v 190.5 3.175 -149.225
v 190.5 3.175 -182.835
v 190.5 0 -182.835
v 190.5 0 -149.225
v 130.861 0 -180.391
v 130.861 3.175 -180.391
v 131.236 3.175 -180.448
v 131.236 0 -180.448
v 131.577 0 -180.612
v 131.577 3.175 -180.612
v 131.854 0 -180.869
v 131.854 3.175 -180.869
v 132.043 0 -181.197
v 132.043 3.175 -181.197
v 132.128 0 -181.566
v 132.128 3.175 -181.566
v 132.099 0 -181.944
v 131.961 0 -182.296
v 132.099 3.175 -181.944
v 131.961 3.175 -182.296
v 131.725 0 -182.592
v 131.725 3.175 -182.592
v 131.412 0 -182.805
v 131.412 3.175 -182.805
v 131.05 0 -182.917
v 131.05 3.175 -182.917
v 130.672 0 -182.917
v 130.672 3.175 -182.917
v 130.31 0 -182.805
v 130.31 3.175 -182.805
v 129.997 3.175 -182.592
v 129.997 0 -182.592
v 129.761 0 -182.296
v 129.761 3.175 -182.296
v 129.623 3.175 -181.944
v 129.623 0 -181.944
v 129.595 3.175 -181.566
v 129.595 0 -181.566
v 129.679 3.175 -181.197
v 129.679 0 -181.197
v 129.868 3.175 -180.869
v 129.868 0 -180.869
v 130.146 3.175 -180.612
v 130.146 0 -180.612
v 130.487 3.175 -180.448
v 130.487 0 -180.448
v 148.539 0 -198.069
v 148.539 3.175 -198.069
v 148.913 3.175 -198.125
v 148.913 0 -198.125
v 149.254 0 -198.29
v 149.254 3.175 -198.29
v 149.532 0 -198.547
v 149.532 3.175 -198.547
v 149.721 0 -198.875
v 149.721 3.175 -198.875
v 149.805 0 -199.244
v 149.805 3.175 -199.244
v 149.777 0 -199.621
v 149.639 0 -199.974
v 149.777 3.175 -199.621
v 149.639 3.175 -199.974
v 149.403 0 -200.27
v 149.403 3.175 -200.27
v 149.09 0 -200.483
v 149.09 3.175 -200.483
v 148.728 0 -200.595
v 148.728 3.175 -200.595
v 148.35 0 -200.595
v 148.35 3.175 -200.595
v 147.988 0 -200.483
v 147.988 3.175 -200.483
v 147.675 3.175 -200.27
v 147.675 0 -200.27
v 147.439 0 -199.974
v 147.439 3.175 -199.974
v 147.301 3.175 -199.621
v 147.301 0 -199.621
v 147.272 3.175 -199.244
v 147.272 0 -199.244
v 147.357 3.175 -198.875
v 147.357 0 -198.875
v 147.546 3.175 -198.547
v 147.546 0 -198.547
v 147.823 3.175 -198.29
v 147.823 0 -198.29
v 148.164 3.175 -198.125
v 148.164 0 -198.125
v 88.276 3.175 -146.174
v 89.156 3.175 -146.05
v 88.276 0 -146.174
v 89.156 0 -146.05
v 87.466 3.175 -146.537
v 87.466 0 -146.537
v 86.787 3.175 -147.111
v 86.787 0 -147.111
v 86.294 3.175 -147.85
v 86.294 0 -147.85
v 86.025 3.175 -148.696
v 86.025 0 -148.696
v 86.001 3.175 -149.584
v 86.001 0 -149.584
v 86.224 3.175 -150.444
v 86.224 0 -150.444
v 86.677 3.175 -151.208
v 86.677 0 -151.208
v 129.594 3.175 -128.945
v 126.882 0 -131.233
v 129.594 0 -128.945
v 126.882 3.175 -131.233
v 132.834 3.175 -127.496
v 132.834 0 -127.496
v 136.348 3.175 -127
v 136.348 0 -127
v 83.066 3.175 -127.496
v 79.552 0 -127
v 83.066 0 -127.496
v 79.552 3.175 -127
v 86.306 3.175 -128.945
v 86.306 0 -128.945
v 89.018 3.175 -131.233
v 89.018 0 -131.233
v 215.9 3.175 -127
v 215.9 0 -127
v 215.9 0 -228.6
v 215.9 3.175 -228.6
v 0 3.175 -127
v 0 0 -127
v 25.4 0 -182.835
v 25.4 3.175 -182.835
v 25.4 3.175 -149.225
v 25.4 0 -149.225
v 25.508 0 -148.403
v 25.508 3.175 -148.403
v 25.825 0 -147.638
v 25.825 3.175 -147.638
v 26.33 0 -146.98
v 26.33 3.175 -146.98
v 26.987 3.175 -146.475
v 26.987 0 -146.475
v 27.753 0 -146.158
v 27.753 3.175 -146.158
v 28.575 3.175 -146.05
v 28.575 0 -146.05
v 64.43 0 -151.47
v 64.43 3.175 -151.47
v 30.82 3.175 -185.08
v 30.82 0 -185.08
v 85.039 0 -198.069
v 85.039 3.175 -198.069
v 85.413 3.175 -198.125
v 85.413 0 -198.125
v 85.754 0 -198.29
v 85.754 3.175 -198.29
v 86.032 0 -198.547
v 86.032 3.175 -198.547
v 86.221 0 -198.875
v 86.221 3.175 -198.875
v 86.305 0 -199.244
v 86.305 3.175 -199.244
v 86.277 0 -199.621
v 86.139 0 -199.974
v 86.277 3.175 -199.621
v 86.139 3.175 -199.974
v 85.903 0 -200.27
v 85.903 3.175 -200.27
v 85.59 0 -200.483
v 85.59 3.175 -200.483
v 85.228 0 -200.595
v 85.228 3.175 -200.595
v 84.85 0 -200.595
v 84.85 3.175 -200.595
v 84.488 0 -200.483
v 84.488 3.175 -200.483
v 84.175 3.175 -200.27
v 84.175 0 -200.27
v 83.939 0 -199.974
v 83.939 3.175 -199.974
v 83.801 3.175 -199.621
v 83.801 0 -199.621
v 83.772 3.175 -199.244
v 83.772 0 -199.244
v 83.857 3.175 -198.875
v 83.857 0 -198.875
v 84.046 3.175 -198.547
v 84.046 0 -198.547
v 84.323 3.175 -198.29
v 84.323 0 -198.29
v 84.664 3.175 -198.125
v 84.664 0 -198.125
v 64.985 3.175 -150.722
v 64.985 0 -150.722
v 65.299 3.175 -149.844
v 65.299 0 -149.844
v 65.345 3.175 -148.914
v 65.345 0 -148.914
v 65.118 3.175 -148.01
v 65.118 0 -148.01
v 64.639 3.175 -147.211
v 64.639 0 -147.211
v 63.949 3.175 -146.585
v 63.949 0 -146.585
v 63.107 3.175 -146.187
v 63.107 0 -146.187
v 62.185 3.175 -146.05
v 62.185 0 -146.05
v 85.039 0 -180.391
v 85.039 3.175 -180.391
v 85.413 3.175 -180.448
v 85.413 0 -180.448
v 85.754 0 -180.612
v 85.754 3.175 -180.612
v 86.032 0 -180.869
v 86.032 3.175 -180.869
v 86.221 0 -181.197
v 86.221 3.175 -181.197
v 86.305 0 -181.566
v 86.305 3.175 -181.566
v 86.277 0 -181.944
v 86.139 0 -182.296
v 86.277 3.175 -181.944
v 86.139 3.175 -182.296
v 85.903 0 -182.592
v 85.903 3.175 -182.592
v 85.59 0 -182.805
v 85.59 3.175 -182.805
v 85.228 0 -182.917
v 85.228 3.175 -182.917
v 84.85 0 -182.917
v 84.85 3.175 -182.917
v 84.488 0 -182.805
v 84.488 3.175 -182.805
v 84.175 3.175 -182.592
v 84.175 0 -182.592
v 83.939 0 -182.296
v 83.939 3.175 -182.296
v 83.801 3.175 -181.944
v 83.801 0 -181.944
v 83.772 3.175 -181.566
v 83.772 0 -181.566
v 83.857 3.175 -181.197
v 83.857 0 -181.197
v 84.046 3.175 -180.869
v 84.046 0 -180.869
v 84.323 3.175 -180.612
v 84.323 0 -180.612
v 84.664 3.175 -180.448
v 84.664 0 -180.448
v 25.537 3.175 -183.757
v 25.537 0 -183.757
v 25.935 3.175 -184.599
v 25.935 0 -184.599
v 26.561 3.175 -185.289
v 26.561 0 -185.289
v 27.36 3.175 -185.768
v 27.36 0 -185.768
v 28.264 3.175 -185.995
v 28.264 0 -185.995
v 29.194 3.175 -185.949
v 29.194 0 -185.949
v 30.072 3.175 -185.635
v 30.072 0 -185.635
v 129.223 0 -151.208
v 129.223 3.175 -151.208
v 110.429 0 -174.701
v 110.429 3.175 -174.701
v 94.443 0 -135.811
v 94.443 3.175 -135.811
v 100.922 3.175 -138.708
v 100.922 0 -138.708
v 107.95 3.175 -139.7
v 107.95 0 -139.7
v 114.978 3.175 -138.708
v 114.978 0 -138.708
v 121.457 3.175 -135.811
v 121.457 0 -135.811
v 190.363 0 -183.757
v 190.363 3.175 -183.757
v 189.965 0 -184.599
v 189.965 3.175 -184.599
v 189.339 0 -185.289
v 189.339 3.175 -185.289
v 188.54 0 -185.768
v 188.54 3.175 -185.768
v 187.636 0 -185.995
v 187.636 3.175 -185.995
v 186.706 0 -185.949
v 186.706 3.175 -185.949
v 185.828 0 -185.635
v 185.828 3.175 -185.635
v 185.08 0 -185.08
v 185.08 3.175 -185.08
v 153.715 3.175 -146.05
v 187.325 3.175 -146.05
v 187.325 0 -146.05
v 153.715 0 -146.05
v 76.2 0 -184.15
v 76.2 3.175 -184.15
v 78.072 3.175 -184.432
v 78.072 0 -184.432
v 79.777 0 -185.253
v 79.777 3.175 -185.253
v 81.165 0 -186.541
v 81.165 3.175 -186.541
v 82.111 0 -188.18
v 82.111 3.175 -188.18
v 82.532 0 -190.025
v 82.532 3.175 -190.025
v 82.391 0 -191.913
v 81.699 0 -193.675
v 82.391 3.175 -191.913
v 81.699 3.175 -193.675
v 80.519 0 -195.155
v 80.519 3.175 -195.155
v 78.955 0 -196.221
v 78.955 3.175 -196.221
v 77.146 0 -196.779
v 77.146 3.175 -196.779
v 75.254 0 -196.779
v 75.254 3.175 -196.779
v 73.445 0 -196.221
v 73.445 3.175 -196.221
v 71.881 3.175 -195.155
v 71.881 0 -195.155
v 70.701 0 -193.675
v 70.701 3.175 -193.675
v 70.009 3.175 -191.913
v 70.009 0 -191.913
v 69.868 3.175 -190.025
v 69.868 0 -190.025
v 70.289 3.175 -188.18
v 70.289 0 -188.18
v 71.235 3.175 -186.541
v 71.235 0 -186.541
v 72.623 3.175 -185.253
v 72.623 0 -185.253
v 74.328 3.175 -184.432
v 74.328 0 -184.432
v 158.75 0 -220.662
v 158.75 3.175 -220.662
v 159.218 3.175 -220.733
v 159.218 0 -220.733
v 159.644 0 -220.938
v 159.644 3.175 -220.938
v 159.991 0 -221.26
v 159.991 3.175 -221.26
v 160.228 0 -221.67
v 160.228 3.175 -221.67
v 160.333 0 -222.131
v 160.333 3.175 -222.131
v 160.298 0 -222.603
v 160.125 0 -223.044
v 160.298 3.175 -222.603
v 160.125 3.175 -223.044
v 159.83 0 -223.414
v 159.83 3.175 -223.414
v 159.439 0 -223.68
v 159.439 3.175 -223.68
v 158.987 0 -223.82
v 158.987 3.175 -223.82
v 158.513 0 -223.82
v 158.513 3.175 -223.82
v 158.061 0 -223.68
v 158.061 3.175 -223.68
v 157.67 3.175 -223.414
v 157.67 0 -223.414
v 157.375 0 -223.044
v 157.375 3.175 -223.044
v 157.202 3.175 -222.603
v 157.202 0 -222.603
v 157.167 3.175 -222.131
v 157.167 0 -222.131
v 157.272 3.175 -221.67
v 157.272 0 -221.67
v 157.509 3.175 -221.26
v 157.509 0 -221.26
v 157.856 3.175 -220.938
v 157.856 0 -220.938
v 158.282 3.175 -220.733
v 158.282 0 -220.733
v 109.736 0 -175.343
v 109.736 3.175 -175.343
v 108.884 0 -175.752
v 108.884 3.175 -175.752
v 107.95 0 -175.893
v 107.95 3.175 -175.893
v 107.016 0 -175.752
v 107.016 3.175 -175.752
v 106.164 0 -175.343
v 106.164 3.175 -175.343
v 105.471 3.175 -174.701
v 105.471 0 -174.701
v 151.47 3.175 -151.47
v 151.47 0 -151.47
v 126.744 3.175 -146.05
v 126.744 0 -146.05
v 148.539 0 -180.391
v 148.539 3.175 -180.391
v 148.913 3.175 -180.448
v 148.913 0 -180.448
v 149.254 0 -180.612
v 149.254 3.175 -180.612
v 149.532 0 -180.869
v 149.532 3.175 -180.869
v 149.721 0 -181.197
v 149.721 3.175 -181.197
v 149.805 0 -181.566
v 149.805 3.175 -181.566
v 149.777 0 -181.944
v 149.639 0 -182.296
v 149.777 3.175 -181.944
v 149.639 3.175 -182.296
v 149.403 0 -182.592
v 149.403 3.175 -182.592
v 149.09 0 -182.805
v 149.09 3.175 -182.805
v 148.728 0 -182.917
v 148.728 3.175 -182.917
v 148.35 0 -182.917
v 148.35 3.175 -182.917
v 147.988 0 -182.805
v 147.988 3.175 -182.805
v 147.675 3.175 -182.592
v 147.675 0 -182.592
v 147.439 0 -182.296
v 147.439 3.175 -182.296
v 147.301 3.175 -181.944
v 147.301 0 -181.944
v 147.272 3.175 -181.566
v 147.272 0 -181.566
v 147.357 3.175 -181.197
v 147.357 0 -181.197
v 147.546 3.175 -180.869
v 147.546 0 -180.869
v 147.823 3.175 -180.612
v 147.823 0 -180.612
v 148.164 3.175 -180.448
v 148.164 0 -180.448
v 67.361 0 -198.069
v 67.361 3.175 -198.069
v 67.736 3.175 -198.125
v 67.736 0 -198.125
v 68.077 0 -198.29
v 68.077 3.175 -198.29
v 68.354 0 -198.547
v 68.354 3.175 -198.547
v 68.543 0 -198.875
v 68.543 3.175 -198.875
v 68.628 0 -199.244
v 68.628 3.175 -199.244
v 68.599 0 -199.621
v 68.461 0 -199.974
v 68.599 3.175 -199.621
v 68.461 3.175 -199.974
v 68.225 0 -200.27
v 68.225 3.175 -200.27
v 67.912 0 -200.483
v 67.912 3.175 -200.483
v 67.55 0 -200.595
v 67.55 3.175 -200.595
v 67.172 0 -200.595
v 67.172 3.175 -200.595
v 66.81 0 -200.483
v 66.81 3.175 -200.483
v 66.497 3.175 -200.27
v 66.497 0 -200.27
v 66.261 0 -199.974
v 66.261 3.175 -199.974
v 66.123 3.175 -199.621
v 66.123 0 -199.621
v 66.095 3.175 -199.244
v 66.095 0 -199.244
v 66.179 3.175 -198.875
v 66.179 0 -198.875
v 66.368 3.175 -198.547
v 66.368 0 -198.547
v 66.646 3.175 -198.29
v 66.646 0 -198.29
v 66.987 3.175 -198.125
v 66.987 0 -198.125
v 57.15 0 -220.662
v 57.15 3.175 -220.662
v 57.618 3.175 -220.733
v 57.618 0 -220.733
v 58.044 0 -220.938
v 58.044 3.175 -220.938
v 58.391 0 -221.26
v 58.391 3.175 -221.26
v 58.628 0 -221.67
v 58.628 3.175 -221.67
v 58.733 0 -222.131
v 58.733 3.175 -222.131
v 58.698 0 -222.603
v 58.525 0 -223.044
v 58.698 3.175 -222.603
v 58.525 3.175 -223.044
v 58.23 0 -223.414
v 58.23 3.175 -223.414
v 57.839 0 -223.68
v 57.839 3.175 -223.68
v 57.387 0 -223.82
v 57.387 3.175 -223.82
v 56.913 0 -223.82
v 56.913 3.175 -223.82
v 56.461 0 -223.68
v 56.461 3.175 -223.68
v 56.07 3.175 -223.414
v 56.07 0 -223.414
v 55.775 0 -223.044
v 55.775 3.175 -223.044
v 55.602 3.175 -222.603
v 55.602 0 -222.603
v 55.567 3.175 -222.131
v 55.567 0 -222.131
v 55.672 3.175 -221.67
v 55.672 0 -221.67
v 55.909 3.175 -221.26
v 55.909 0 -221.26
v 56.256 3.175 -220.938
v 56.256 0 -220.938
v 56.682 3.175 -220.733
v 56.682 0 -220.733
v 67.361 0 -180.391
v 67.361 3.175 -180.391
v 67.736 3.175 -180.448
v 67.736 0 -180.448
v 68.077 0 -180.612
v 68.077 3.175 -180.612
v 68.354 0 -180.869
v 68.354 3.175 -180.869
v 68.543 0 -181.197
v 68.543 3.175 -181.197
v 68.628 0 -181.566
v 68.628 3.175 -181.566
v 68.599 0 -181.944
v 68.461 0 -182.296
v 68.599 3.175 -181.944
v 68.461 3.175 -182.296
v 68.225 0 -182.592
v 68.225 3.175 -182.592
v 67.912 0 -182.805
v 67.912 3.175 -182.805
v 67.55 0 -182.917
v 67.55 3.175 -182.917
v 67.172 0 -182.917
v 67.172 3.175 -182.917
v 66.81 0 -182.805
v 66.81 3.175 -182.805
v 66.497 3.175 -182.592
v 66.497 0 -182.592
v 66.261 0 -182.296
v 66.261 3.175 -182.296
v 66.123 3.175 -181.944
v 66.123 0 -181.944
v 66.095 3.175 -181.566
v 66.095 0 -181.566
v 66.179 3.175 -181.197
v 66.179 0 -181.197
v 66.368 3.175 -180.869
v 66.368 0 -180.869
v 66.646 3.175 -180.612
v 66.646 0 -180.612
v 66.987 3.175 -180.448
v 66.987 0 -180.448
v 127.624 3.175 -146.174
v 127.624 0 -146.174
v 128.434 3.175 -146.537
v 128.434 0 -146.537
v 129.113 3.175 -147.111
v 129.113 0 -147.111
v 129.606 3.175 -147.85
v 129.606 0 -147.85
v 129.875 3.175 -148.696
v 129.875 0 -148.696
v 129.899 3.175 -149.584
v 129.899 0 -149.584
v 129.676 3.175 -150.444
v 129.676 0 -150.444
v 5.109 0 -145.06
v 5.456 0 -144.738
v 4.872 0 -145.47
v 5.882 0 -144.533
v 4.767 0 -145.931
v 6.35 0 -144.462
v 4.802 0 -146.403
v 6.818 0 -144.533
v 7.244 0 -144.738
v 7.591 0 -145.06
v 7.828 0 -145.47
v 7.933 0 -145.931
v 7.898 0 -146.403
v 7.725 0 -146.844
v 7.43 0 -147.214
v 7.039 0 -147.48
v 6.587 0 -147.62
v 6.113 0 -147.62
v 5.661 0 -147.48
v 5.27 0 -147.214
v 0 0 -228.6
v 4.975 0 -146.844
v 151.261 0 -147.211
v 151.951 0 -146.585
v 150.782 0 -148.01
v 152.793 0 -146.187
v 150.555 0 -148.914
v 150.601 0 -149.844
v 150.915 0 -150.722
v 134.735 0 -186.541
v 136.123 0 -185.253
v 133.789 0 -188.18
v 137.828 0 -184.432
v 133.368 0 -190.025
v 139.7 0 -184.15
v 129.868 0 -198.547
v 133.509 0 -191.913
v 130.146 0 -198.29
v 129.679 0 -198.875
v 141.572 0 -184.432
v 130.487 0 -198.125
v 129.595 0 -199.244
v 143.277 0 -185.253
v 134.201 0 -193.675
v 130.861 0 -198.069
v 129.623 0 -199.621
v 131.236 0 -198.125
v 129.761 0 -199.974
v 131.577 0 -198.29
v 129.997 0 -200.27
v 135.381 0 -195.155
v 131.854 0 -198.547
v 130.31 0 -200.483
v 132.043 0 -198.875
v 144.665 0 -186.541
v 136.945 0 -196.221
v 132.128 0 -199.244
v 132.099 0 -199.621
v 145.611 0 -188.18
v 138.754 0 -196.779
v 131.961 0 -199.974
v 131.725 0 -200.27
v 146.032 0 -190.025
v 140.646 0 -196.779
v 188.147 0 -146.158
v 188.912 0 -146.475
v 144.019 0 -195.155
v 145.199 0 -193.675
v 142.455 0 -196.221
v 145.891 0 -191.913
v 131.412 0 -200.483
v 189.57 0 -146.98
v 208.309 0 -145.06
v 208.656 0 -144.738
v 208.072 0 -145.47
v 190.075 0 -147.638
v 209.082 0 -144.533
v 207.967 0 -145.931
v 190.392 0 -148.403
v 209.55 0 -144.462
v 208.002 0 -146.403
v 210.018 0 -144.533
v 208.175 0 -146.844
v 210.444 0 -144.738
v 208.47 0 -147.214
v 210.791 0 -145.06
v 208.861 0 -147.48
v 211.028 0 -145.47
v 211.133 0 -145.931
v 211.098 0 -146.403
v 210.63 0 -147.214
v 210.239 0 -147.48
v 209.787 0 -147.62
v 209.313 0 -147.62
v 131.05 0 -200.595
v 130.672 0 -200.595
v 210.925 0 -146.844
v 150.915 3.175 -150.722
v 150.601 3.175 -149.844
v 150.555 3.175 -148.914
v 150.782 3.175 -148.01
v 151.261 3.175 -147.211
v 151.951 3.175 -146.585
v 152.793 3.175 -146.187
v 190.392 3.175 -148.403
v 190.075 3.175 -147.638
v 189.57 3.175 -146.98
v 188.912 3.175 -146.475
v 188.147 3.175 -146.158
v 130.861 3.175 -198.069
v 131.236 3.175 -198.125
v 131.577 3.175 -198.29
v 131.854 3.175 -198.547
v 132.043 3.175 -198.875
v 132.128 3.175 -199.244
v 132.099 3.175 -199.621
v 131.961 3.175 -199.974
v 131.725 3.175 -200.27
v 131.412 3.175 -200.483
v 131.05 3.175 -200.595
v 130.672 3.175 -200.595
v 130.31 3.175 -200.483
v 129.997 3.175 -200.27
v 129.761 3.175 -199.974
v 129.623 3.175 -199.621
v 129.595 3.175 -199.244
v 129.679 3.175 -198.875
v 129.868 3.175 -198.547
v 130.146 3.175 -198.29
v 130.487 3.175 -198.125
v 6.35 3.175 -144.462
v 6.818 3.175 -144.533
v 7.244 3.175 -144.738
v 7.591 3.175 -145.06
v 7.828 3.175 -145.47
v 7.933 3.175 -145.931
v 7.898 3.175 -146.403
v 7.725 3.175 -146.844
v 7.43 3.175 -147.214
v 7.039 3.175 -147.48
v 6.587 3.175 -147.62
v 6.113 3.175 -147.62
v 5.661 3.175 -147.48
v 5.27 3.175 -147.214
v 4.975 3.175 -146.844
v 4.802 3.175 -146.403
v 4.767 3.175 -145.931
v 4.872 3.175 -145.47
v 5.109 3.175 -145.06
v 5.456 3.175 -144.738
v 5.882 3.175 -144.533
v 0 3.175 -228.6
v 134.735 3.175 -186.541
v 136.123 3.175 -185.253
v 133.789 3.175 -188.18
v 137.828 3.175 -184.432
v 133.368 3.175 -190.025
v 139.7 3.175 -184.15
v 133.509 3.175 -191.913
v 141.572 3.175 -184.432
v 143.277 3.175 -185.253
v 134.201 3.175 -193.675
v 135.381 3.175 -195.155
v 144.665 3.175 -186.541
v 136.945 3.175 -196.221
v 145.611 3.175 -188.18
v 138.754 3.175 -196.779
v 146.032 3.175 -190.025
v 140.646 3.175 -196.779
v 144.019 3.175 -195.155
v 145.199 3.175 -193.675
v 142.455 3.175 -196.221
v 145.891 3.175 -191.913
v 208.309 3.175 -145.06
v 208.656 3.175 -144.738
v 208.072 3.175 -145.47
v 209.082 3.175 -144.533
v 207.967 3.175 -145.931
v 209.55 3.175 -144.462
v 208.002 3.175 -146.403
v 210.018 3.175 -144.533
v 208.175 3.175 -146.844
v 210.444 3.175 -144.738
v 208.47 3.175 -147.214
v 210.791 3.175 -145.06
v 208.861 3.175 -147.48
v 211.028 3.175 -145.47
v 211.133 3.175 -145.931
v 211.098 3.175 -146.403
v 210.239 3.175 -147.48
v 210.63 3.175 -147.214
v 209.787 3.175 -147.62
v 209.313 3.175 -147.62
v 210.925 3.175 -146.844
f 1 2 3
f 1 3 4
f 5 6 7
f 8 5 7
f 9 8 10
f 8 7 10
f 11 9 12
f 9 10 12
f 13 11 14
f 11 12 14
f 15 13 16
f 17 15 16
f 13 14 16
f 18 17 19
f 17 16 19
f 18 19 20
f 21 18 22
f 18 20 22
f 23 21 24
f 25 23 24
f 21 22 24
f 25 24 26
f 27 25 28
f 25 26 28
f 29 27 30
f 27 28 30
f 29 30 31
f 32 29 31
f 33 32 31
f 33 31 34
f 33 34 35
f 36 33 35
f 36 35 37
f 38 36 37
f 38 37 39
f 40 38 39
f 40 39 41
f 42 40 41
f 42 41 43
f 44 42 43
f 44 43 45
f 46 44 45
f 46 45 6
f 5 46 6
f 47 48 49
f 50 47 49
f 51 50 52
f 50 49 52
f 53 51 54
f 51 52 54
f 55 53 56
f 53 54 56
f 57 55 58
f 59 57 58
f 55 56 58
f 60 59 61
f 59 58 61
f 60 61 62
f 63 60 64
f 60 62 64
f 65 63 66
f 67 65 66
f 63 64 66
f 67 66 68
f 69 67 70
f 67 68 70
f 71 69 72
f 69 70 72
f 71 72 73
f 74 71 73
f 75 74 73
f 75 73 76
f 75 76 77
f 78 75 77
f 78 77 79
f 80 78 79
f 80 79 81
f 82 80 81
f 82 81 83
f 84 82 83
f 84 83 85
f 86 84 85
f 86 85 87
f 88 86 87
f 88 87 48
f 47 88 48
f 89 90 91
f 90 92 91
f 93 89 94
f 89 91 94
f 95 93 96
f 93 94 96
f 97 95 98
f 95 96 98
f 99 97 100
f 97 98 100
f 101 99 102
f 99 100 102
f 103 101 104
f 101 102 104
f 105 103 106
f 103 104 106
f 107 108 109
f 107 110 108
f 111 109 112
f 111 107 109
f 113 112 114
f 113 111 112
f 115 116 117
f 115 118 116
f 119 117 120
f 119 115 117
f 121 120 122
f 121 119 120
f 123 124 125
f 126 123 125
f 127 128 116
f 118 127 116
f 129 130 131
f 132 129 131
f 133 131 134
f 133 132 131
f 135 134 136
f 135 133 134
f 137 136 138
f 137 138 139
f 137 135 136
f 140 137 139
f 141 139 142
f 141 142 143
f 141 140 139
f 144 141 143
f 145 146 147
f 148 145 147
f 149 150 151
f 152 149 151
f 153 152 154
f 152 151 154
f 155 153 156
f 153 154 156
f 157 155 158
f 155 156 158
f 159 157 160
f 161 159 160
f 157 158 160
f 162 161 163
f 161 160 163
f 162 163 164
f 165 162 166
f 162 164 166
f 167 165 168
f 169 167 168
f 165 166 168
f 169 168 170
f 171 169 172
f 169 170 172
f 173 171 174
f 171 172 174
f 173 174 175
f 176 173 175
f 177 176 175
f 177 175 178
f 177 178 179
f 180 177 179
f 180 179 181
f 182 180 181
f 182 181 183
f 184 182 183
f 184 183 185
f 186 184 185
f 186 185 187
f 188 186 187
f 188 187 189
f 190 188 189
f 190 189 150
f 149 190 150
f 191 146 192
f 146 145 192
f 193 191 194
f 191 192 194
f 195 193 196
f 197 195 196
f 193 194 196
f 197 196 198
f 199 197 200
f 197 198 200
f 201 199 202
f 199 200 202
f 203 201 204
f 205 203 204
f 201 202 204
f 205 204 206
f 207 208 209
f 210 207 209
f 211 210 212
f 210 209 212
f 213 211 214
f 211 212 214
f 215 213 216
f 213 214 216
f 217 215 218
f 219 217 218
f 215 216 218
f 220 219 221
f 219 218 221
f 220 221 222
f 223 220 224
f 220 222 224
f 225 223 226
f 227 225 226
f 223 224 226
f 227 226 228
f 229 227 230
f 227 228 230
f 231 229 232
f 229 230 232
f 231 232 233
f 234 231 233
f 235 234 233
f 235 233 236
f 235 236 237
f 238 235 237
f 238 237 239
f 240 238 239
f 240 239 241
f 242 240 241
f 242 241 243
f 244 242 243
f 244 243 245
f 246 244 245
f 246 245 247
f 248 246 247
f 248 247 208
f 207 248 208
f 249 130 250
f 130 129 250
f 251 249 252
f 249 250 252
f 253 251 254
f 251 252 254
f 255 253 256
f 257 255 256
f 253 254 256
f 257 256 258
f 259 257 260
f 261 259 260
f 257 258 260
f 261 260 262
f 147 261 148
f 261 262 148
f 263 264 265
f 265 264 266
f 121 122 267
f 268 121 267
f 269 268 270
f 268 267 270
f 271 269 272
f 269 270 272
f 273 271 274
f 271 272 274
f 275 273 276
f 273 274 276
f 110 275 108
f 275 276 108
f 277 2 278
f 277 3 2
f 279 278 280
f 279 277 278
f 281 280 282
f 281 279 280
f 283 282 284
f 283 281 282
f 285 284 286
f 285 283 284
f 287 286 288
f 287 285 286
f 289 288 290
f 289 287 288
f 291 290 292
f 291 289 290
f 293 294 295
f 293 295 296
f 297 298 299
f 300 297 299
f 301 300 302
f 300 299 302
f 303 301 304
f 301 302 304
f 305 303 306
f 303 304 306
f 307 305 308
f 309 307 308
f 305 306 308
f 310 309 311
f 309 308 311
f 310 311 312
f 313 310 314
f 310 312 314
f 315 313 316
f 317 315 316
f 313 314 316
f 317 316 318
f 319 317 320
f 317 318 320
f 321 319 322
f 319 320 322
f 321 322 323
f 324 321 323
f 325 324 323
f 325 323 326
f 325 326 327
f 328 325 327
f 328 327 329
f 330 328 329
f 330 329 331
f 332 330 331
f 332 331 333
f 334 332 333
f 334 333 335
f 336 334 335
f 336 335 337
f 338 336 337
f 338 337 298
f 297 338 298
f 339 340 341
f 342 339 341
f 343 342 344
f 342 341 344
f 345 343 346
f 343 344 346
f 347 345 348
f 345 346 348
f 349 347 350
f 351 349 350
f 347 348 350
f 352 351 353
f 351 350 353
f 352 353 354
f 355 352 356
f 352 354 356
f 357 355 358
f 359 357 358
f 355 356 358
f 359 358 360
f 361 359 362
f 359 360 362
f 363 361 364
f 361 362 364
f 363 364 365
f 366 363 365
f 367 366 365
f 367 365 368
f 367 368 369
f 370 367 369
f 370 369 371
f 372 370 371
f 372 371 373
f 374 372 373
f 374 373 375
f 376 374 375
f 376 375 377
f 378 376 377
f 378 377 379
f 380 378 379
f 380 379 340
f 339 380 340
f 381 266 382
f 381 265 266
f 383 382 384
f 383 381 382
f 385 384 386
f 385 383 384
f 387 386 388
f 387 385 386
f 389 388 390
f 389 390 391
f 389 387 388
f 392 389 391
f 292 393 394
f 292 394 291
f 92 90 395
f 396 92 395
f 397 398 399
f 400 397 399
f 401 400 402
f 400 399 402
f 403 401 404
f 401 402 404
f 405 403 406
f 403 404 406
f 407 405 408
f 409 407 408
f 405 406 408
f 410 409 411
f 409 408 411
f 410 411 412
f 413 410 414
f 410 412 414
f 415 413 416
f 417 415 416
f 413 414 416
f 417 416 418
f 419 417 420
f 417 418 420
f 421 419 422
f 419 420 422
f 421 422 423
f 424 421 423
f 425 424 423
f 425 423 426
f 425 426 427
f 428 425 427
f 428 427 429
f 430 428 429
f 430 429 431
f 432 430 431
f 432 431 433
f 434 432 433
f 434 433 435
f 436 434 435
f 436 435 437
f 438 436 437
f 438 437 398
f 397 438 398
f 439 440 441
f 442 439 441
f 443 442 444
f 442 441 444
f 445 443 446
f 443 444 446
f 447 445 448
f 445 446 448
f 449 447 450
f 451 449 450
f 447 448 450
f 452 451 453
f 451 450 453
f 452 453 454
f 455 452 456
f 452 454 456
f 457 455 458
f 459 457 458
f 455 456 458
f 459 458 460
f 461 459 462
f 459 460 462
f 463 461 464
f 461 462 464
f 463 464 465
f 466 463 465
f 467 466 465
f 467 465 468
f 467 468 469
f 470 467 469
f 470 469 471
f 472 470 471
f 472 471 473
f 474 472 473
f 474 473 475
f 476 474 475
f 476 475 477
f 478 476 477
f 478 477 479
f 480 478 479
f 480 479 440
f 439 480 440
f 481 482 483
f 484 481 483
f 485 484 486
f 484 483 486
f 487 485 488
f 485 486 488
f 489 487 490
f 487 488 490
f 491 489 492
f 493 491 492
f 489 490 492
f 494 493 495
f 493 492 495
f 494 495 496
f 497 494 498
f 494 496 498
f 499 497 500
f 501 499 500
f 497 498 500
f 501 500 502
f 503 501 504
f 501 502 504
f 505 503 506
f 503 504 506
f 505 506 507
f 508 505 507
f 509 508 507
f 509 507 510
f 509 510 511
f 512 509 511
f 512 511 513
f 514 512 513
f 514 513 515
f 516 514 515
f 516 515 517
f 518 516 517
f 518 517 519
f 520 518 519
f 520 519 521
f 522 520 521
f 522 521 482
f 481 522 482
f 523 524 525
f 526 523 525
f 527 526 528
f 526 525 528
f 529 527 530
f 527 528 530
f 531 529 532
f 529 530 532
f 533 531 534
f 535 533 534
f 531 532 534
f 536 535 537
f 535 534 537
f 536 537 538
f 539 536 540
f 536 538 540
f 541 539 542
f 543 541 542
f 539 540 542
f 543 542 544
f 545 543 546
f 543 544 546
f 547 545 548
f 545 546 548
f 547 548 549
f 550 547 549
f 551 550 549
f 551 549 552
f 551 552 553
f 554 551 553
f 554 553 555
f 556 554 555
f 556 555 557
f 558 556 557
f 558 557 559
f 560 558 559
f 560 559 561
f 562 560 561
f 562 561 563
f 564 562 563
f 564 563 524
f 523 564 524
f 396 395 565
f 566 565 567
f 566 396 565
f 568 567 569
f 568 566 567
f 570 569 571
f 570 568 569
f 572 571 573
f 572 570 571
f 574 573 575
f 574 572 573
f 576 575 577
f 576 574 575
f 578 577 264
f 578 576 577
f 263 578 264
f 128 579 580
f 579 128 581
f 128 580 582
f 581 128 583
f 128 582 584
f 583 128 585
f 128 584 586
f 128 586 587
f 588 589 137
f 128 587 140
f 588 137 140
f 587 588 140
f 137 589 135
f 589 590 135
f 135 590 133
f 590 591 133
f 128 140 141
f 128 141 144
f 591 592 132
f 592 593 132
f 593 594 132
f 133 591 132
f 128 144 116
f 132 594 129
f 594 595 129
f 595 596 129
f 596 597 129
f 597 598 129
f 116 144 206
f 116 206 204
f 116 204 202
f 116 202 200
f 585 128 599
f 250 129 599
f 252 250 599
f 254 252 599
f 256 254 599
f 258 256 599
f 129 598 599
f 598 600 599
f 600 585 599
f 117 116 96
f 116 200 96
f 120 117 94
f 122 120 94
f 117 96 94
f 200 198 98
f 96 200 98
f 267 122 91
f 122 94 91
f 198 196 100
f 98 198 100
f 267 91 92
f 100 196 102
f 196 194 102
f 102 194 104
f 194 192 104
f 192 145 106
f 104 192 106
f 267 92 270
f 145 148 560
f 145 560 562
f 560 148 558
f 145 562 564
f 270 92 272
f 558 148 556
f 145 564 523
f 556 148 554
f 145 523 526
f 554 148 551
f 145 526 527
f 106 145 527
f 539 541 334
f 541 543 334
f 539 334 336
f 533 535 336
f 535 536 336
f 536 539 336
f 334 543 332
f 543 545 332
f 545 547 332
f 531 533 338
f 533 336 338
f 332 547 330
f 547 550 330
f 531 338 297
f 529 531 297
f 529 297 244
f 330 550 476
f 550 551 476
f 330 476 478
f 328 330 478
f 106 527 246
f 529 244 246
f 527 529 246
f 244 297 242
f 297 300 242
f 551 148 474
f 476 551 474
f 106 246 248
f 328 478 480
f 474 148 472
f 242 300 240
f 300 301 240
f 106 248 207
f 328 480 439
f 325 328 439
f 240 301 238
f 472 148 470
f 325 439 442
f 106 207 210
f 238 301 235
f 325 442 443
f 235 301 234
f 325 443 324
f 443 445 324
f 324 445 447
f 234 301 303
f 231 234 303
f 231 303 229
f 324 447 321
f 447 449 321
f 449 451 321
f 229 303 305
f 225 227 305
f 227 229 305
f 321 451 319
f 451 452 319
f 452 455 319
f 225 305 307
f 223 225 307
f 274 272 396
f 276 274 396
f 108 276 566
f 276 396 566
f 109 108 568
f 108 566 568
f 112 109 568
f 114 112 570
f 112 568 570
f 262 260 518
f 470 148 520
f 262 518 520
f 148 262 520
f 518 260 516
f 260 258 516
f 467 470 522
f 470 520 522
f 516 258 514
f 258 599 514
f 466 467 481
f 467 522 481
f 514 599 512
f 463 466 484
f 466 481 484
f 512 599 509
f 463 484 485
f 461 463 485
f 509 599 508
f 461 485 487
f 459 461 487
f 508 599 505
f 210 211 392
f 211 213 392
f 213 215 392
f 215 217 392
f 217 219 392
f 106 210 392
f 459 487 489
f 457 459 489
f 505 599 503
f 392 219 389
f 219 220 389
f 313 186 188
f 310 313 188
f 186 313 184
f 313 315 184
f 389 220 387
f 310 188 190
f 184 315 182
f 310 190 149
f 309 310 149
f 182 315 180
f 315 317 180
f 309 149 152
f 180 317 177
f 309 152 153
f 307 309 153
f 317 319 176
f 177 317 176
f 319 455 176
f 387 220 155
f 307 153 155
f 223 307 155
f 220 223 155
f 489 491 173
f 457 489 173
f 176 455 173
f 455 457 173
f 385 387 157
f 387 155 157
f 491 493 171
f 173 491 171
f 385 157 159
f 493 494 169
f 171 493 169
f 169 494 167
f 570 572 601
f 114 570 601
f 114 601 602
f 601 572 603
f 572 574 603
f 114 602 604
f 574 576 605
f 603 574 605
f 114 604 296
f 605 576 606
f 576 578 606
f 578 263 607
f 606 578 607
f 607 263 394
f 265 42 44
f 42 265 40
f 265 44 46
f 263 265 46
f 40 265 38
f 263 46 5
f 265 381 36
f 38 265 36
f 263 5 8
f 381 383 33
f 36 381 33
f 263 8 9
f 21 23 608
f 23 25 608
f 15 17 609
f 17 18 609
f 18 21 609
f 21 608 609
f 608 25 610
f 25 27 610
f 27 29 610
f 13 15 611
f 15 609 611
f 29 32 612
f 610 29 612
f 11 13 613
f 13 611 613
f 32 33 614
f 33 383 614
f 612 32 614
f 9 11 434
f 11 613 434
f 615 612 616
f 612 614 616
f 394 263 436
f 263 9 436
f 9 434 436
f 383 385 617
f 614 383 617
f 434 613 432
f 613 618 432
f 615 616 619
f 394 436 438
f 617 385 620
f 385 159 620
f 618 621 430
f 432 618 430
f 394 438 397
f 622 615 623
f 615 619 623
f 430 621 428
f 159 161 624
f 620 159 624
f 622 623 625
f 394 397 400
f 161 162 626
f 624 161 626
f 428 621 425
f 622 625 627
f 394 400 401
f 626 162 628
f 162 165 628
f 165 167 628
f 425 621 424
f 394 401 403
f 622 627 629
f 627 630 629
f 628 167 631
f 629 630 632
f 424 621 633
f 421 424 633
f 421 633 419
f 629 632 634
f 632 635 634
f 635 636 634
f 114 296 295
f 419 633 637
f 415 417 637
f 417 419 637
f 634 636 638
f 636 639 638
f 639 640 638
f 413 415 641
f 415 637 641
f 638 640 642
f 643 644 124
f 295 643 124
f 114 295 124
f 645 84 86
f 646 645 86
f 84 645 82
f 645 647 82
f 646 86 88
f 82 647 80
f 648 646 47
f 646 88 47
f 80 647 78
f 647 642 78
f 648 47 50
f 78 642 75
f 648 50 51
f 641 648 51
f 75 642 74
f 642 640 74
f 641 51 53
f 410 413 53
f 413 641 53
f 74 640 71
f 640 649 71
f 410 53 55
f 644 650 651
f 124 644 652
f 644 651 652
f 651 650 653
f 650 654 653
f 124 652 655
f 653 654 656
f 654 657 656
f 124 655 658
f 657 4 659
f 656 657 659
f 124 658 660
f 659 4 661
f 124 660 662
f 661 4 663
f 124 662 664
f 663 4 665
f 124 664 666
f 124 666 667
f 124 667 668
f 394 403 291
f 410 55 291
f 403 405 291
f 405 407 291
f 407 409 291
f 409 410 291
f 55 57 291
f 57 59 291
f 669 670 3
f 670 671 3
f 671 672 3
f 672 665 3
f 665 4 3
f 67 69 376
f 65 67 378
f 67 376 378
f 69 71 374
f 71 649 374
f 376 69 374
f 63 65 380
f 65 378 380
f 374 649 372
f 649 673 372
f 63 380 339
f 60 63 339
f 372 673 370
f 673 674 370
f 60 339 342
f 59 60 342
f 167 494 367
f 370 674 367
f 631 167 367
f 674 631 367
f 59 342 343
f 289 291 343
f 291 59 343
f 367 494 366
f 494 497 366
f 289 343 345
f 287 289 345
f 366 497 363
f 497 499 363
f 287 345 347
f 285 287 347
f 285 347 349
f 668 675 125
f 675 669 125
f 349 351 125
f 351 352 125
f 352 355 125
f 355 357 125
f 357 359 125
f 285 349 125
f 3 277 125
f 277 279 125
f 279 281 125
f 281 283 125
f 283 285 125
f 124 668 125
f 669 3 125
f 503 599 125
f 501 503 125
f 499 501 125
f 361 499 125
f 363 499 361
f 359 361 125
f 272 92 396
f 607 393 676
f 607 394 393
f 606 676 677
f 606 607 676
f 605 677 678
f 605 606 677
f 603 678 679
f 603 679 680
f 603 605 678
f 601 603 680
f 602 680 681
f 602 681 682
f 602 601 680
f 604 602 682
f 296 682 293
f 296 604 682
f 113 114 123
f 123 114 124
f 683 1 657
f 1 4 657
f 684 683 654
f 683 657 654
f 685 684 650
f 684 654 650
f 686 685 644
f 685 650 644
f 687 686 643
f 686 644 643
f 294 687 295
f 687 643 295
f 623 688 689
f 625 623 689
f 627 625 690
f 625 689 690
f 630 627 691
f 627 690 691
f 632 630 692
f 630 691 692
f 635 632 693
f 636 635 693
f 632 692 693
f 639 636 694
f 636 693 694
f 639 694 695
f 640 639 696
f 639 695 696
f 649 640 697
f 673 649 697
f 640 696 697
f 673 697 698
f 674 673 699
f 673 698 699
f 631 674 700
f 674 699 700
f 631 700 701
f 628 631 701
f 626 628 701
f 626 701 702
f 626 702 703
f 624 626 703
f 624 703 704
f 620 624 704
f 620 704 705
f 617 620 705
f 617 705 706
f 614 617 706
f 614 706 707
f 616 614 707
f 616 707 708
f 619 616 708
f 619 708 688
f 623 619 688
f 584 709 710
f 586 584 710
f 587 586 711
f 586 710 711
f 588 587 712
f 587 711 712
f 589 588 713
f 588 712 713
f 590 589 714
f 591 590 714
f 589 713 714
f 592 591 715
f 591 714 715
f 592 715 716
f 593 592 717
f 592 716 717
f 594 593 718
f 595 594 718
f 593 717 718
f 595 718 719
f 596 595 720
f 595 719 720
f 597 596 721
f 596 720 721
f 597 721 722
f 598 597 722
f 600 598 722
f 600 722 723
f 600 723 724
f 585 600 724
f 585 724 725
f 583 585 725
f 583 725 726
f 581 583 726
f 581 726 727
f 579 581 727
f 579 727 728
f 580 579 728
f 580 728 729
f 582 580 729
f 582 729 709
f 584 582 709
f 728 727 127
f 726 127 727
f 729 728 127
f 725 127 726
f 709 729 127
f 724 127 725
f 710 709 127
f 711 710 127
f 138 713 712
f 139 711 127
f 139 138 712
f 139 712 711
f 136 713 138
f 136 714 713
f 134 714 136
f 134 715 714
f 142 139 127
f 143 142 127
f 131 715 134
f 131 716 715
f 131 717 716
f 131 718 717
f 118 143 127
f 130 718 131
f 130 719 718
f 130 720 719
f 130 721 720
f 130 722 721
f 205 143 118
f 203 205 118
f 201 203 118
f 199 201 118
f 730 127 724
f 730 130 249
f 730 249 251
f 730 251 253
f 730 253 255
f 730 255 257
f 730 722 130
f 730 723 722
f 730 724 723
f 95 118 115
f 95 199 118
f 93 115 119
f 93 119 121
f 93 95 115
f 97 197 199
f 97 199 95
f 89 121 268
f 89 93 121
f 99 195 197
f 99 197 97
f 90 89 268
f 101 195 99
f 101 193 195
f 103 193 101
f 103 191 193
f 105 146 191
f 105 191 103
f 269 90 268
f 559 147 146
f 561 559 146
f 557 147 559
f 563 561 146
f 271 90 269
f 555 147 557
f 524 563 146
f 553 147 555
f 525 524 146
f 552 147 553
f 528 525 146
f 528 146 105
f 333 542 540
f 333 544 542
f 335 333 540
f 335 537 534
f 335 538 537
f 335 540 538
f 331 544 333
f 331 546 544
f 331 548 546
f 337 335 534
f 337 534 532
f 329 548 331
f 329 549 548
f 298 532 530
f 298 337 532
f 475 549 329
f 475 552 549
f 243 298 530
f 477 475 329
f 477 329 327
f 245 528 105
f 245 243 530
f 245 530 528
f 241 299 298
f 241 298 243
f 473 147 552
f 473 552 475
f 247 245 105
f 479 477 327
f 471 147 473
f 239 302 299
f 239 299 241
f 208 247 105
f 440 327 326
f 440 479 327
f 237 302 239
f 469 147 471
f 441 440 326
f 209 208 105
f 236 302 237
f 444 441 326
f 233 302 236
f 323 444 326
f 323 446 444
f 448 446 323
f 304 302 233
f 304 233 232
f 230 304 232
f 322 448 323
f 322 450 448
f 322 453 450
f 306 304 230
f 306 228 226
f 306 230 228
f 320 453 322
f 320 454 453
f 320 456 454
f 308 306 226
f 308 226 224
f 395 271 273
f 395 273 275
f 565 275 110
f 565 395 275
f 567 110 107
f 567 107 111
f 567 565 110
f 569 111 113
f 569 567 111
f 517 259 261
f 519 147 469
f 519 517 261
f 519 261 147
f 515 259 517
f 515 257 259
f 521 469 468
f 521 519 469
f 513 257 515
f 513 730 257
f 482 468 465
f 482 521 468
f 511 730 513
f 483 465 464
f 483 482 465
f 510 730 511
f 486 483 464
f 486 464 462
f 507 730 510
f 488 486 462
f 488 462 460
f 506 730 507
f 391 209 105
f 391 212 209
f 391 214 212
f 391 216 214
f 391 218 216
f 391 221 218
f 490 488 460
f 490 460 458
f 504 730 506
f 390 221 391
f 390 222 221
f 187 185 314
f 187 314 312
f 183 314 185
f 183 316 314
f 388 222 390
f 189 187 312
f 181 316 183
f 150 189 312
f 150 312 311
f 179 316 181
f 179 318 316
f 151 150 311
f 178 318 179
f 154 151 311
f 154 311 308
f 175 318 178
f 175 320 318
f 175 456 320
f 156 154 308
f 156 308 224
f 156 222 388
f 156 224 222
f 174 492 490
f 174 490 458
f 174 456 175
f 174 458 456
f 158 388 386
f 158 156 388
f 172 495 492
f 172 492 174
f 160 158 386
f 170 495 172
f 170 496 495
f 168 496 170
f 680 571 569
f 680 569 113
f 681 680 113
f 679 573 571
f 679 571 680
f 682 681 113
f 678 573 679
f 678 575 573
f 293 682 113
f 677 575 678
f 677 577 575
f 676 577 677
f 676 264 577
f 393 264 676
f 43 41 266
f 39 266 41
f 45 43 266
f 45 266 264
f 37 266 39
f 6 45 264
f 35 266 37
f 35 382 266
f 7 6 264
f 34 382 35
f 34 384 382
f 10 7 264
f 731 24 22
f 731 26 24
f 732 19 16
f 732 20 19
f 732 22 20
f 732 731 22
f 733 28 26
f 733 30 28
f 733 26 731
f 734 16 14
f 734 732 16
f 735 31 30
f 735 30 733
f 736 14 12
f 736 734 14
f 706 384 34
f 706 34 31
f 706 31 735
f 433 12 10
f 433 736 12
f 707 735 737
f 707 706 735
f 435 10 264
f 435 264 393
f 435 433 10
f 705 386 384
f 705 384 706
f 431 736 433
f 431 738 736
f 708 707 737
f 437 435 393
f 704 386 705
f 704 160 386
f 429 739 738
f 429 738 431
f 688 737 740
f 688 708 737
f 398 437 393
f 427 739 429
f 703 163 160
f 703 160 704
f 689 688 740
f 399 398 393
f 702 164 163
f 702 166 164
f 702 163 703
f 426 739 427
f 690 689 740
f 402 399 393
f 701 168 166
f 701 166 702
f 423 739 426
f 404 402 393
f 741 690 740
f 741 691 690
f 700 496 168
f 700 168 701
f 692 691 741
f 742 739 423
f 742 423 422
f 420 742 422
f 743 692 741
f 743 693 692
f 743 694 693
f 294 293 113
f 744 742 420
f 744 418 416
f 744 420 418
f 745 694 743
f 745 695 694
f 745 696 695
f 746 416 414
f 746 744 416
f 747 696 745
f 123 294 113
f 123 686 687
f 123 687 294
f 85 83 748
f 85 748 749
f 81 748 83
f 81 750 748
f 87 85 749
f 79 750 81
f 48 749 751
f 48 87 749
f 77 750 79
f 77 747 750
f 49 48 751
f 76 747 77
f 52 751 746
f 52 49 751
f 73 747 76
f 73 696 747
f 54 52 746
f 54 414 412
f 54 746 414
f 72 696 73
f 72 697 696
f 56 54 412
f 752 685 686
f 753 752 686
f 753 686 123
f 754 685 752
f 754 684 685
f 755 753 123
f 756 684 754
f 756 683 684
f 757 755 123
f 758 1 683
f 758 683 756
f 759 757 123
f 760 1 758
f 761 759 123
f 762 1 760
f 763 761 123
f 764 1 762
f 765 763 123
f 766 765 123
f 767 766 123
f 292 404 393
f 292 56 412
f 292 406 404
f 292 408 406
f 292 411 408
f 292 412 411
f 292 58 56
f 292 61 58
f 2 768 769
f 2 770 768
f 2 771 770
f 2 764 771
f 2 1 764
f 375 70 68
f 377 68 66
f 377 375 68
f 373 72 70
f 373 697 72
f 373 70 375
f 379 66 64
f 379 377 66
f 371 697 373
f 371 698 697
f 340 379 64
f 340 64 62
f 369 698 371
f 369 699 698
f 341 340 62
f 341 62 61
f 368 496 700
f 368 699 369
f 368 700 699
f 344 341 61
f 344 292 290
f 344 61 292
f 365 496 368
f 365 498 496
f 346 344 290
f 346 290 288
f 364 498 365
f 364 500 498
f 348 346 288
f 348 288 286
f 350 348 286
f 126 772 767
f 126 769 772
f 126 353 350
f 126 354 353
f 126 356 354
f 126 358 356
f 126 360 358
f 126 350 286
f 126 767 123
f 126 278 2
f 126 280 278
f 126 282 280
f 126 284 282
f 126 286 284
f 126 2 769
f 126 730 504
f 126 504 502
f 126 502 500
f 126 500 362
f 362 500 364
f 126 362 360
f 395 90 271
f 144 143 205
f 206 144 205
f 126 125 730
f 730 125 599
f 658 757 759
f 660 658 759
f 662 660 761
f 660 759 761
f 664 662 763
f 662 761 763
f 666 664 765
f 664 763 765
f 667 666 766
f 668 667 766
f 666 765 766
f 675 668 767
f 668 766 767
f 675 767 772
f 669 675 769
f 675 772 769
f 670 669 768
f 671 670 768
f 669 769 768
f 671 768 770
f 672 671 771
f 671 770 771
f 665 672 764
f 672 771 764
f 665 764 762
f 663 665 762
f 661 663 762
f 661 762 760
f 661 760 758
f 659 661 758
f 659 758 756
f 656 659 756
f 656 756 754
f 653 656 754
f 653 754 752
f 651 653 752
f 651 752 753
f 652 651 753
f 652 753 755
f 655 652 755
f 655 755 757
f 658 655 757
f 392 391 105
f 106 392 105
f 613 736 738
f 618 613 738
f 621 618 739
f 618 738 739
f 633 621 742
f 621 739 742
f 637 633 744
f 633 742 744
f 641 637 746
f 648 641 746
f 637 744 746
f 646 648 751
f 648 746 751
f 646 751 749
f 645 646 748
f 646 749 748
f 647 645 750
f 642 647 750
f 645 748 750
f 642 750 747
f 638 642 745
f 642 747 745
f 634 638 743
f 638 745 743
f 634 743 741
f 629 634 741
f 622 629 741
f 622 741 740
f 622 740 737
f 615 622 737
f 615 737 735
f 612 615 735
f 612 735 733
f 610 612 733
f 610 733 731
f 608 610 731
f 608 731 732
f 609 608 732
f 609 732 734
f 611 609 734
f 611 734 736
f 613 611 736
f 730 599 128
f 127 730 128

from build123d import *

# Parameters (mm, degrees)
BOSS_EXTRUDE1_DEPTH = 3.175
SKETCH2_R           = 6.35
CUT_EXTRUDE1_DEPTH  = 315.453256661
FILLET1_R           = 12.7
SKETCH3_R           = 1.27
CUT_EXTRUDE2_DEPTH  = 315.453256661
SKETCH4_R           = 1.5875
CUT_EXTRUDE3_DEPTH  = 315.453256661
CUT_EXTRUDE4_DEPTH  = 315.453256661
CUT_EXTRUDE5_DEPTH  = 315.453256661
FILLET2_R           = 3.175


with BuildPart() as part:
    # Sketch1 → Boss-Extrude1 (new body)
    with BuildSketch(Plane(origin=(0, 0, 0), x_dir=(1, 0, 0), z_dir=(0, 1, 0))):
        with BuildLine():
            Line((0, 228.6), (0, 127))
            Line((0, 127), (85.952954744, 127))
            ThreePointArc((85.952954744, 127), (107.95, 139.7), (129.947045256, 127))
            Line((129.947045256, 127), (215.9, 127))
            Line((215.9, 127), (215.9, 228.6))
            Line((215.9, 228.6), (0, 228.6))
        make_face()
    extrude(amount=BOSS_EXTRUDE1_DEPTH)

    # Sketch2 → Cut-Extrude1 (cut, through all)
    with BuildSketch(Plane(origin=(0, 3.175, 0), x_dir=(1, 0, 0), z_dir=(0, 1, 0))):
        with Locations(Location((76.2, 190.5, 0), (0, 0, 270))):
            Circle(SKETCH2_R)
        with Locations(Location((139.7, 190.5, 0), (0, 0, 270))):
            Circle(SKETCH2_R)
    extrude(amount=-CUT_EXTRUDE1_DEPTH, mode=Mode.SUBTRACT)

    # Fillet1
    fillet1_edges = [part.edges().sort_by_distance(p)[0] for p in [
        (85.952954744, 1.5875, -127),
        (129.947045256, 1.5875, -127),
    ]]
    fillet(fillet1_edges, radius=FILLET1_R)

    # Sketch3 → Cut-Extrude2 (cut, through all)
    with BuildSketch(Plane(origin=(0, 3.175, 0), x_dir=(1, 0, 0), z_dir=(0, 1, 0))):
        with Locations(Location((85.038834765, 199.338834765, 0), (0, 0, 270))):
            Circle(SKETCH3_R)
        with Locations(Location((67.361165235, 181.661165235, 0), (0, 0, 270))):
            Circle(SKETCH3_R)
        with Locations(Location((67.361165235, 199.338834765, 0), (0, 0, 270))):
            Circle(SKETCH3_R)
        with Locations(Location((85.038834765, 181.661165235, 0), (0, 0, 270))):
            Circle(SKETCH3_R)
        with Locations(Location((130.861165235, 181.661165235, 0), (0, 0, 270))):
            Circle(SKETCH3_R)
        with Locations(Location((148.538834765, 181.661165235, 0), (0, 0, 270))):
            Circle(SKETCH3_R)
        with Locations(Location((148.538834765, 199.338834765, 0), (0, 0, 270))):
            Circle(SKETCH3_R)
        with Locations(Location((130.861165235, 199.338834765, 0), (0, 0, 270))):
            Circle(SKETCH3_R)
    extrude(amount=-CUT_EXTRUDE2_DEPTH, mode=Mode.SUBTRACT)

    # Sketch4 → Cut-Extrude3 (cut, through all)
    with BuildSketch(Plane(origin=(0, 3.175, 0), x_dir=(1, 0, 0), z_dir=(0, 1, 0))):
        with Locations(Location((6.35, 146.05, 0), (0, 0, 270))):
            Circle(SKETCH4_R)
        with Locations(Location((57.15, 222.25, 0), (0, 0, 270))):
            Circle(SKETCH4_R)
        with Locations(Location((158.75, 222.25, 0), (0, 0, 270))):
            Circle(SKETCH4_R)
        with Locations(Location((209.55, 146.05, 0), (0, 0, 270))):
            Circle(SKETCH4_R)
    extrude(amount=-CUT_EXTRUDE3_DEPTH, mode=Mode.SUBTRACT)

    # Sketch5 → Cut-Extrude4 (cut, through all)
    with BuildSketch(Plane(origin=(0, 3.175, 0), x_dir=(1, 0, 0), z_dir=(0, 1, 0))):
        Polygon((25.4, 190.5), (25.4, 146.05), (69.85, 146.05), align=None)
        Polygon((190.5, 146.05), (146.05, 146.05), (190.5, 190.5), align=None)
    extrude(amount=-CUT_EXTRUDE4_DEPTH, mode=Mode.SUBTRACT)

    # Sketch6 → Cut-Extrude5 (cut, through all)
    with BuildSketch(Plane(origin=(0, 3.175, 0), x_dir=(1, 0, 0), z_dir=(0, 1, 0))):
        Polygon((82.55, 146.05), (133.35, 146.05), (107.95, 177.8), align=None)
    extrude(amount=-CUT_EXTRUDE5_DEPTH, mode=Mode.SUBTRACT)

    # Fillet2
    fillet2_edges = [part.edges().sort_by_distance(p)[0] for p in [
        (25.4, 1.5875, -190.5),
        (69.85, 1.5875, -146.05),
        (25.4, 1.5875, -146.05),
        (190.5, 1.5875, -190.5),
        (190.5, 1.5875, -146.05),
        (146.05, 1.5875, -146.05),
        (82.55, 1.5875, -146.05),
        (107.95, 1.5875, -177.8),
        (133.35, 1.5875, -146.05),
    ]]
    fillet(fillet2_edges, radius=FILLET2_R)


solid = part.part
